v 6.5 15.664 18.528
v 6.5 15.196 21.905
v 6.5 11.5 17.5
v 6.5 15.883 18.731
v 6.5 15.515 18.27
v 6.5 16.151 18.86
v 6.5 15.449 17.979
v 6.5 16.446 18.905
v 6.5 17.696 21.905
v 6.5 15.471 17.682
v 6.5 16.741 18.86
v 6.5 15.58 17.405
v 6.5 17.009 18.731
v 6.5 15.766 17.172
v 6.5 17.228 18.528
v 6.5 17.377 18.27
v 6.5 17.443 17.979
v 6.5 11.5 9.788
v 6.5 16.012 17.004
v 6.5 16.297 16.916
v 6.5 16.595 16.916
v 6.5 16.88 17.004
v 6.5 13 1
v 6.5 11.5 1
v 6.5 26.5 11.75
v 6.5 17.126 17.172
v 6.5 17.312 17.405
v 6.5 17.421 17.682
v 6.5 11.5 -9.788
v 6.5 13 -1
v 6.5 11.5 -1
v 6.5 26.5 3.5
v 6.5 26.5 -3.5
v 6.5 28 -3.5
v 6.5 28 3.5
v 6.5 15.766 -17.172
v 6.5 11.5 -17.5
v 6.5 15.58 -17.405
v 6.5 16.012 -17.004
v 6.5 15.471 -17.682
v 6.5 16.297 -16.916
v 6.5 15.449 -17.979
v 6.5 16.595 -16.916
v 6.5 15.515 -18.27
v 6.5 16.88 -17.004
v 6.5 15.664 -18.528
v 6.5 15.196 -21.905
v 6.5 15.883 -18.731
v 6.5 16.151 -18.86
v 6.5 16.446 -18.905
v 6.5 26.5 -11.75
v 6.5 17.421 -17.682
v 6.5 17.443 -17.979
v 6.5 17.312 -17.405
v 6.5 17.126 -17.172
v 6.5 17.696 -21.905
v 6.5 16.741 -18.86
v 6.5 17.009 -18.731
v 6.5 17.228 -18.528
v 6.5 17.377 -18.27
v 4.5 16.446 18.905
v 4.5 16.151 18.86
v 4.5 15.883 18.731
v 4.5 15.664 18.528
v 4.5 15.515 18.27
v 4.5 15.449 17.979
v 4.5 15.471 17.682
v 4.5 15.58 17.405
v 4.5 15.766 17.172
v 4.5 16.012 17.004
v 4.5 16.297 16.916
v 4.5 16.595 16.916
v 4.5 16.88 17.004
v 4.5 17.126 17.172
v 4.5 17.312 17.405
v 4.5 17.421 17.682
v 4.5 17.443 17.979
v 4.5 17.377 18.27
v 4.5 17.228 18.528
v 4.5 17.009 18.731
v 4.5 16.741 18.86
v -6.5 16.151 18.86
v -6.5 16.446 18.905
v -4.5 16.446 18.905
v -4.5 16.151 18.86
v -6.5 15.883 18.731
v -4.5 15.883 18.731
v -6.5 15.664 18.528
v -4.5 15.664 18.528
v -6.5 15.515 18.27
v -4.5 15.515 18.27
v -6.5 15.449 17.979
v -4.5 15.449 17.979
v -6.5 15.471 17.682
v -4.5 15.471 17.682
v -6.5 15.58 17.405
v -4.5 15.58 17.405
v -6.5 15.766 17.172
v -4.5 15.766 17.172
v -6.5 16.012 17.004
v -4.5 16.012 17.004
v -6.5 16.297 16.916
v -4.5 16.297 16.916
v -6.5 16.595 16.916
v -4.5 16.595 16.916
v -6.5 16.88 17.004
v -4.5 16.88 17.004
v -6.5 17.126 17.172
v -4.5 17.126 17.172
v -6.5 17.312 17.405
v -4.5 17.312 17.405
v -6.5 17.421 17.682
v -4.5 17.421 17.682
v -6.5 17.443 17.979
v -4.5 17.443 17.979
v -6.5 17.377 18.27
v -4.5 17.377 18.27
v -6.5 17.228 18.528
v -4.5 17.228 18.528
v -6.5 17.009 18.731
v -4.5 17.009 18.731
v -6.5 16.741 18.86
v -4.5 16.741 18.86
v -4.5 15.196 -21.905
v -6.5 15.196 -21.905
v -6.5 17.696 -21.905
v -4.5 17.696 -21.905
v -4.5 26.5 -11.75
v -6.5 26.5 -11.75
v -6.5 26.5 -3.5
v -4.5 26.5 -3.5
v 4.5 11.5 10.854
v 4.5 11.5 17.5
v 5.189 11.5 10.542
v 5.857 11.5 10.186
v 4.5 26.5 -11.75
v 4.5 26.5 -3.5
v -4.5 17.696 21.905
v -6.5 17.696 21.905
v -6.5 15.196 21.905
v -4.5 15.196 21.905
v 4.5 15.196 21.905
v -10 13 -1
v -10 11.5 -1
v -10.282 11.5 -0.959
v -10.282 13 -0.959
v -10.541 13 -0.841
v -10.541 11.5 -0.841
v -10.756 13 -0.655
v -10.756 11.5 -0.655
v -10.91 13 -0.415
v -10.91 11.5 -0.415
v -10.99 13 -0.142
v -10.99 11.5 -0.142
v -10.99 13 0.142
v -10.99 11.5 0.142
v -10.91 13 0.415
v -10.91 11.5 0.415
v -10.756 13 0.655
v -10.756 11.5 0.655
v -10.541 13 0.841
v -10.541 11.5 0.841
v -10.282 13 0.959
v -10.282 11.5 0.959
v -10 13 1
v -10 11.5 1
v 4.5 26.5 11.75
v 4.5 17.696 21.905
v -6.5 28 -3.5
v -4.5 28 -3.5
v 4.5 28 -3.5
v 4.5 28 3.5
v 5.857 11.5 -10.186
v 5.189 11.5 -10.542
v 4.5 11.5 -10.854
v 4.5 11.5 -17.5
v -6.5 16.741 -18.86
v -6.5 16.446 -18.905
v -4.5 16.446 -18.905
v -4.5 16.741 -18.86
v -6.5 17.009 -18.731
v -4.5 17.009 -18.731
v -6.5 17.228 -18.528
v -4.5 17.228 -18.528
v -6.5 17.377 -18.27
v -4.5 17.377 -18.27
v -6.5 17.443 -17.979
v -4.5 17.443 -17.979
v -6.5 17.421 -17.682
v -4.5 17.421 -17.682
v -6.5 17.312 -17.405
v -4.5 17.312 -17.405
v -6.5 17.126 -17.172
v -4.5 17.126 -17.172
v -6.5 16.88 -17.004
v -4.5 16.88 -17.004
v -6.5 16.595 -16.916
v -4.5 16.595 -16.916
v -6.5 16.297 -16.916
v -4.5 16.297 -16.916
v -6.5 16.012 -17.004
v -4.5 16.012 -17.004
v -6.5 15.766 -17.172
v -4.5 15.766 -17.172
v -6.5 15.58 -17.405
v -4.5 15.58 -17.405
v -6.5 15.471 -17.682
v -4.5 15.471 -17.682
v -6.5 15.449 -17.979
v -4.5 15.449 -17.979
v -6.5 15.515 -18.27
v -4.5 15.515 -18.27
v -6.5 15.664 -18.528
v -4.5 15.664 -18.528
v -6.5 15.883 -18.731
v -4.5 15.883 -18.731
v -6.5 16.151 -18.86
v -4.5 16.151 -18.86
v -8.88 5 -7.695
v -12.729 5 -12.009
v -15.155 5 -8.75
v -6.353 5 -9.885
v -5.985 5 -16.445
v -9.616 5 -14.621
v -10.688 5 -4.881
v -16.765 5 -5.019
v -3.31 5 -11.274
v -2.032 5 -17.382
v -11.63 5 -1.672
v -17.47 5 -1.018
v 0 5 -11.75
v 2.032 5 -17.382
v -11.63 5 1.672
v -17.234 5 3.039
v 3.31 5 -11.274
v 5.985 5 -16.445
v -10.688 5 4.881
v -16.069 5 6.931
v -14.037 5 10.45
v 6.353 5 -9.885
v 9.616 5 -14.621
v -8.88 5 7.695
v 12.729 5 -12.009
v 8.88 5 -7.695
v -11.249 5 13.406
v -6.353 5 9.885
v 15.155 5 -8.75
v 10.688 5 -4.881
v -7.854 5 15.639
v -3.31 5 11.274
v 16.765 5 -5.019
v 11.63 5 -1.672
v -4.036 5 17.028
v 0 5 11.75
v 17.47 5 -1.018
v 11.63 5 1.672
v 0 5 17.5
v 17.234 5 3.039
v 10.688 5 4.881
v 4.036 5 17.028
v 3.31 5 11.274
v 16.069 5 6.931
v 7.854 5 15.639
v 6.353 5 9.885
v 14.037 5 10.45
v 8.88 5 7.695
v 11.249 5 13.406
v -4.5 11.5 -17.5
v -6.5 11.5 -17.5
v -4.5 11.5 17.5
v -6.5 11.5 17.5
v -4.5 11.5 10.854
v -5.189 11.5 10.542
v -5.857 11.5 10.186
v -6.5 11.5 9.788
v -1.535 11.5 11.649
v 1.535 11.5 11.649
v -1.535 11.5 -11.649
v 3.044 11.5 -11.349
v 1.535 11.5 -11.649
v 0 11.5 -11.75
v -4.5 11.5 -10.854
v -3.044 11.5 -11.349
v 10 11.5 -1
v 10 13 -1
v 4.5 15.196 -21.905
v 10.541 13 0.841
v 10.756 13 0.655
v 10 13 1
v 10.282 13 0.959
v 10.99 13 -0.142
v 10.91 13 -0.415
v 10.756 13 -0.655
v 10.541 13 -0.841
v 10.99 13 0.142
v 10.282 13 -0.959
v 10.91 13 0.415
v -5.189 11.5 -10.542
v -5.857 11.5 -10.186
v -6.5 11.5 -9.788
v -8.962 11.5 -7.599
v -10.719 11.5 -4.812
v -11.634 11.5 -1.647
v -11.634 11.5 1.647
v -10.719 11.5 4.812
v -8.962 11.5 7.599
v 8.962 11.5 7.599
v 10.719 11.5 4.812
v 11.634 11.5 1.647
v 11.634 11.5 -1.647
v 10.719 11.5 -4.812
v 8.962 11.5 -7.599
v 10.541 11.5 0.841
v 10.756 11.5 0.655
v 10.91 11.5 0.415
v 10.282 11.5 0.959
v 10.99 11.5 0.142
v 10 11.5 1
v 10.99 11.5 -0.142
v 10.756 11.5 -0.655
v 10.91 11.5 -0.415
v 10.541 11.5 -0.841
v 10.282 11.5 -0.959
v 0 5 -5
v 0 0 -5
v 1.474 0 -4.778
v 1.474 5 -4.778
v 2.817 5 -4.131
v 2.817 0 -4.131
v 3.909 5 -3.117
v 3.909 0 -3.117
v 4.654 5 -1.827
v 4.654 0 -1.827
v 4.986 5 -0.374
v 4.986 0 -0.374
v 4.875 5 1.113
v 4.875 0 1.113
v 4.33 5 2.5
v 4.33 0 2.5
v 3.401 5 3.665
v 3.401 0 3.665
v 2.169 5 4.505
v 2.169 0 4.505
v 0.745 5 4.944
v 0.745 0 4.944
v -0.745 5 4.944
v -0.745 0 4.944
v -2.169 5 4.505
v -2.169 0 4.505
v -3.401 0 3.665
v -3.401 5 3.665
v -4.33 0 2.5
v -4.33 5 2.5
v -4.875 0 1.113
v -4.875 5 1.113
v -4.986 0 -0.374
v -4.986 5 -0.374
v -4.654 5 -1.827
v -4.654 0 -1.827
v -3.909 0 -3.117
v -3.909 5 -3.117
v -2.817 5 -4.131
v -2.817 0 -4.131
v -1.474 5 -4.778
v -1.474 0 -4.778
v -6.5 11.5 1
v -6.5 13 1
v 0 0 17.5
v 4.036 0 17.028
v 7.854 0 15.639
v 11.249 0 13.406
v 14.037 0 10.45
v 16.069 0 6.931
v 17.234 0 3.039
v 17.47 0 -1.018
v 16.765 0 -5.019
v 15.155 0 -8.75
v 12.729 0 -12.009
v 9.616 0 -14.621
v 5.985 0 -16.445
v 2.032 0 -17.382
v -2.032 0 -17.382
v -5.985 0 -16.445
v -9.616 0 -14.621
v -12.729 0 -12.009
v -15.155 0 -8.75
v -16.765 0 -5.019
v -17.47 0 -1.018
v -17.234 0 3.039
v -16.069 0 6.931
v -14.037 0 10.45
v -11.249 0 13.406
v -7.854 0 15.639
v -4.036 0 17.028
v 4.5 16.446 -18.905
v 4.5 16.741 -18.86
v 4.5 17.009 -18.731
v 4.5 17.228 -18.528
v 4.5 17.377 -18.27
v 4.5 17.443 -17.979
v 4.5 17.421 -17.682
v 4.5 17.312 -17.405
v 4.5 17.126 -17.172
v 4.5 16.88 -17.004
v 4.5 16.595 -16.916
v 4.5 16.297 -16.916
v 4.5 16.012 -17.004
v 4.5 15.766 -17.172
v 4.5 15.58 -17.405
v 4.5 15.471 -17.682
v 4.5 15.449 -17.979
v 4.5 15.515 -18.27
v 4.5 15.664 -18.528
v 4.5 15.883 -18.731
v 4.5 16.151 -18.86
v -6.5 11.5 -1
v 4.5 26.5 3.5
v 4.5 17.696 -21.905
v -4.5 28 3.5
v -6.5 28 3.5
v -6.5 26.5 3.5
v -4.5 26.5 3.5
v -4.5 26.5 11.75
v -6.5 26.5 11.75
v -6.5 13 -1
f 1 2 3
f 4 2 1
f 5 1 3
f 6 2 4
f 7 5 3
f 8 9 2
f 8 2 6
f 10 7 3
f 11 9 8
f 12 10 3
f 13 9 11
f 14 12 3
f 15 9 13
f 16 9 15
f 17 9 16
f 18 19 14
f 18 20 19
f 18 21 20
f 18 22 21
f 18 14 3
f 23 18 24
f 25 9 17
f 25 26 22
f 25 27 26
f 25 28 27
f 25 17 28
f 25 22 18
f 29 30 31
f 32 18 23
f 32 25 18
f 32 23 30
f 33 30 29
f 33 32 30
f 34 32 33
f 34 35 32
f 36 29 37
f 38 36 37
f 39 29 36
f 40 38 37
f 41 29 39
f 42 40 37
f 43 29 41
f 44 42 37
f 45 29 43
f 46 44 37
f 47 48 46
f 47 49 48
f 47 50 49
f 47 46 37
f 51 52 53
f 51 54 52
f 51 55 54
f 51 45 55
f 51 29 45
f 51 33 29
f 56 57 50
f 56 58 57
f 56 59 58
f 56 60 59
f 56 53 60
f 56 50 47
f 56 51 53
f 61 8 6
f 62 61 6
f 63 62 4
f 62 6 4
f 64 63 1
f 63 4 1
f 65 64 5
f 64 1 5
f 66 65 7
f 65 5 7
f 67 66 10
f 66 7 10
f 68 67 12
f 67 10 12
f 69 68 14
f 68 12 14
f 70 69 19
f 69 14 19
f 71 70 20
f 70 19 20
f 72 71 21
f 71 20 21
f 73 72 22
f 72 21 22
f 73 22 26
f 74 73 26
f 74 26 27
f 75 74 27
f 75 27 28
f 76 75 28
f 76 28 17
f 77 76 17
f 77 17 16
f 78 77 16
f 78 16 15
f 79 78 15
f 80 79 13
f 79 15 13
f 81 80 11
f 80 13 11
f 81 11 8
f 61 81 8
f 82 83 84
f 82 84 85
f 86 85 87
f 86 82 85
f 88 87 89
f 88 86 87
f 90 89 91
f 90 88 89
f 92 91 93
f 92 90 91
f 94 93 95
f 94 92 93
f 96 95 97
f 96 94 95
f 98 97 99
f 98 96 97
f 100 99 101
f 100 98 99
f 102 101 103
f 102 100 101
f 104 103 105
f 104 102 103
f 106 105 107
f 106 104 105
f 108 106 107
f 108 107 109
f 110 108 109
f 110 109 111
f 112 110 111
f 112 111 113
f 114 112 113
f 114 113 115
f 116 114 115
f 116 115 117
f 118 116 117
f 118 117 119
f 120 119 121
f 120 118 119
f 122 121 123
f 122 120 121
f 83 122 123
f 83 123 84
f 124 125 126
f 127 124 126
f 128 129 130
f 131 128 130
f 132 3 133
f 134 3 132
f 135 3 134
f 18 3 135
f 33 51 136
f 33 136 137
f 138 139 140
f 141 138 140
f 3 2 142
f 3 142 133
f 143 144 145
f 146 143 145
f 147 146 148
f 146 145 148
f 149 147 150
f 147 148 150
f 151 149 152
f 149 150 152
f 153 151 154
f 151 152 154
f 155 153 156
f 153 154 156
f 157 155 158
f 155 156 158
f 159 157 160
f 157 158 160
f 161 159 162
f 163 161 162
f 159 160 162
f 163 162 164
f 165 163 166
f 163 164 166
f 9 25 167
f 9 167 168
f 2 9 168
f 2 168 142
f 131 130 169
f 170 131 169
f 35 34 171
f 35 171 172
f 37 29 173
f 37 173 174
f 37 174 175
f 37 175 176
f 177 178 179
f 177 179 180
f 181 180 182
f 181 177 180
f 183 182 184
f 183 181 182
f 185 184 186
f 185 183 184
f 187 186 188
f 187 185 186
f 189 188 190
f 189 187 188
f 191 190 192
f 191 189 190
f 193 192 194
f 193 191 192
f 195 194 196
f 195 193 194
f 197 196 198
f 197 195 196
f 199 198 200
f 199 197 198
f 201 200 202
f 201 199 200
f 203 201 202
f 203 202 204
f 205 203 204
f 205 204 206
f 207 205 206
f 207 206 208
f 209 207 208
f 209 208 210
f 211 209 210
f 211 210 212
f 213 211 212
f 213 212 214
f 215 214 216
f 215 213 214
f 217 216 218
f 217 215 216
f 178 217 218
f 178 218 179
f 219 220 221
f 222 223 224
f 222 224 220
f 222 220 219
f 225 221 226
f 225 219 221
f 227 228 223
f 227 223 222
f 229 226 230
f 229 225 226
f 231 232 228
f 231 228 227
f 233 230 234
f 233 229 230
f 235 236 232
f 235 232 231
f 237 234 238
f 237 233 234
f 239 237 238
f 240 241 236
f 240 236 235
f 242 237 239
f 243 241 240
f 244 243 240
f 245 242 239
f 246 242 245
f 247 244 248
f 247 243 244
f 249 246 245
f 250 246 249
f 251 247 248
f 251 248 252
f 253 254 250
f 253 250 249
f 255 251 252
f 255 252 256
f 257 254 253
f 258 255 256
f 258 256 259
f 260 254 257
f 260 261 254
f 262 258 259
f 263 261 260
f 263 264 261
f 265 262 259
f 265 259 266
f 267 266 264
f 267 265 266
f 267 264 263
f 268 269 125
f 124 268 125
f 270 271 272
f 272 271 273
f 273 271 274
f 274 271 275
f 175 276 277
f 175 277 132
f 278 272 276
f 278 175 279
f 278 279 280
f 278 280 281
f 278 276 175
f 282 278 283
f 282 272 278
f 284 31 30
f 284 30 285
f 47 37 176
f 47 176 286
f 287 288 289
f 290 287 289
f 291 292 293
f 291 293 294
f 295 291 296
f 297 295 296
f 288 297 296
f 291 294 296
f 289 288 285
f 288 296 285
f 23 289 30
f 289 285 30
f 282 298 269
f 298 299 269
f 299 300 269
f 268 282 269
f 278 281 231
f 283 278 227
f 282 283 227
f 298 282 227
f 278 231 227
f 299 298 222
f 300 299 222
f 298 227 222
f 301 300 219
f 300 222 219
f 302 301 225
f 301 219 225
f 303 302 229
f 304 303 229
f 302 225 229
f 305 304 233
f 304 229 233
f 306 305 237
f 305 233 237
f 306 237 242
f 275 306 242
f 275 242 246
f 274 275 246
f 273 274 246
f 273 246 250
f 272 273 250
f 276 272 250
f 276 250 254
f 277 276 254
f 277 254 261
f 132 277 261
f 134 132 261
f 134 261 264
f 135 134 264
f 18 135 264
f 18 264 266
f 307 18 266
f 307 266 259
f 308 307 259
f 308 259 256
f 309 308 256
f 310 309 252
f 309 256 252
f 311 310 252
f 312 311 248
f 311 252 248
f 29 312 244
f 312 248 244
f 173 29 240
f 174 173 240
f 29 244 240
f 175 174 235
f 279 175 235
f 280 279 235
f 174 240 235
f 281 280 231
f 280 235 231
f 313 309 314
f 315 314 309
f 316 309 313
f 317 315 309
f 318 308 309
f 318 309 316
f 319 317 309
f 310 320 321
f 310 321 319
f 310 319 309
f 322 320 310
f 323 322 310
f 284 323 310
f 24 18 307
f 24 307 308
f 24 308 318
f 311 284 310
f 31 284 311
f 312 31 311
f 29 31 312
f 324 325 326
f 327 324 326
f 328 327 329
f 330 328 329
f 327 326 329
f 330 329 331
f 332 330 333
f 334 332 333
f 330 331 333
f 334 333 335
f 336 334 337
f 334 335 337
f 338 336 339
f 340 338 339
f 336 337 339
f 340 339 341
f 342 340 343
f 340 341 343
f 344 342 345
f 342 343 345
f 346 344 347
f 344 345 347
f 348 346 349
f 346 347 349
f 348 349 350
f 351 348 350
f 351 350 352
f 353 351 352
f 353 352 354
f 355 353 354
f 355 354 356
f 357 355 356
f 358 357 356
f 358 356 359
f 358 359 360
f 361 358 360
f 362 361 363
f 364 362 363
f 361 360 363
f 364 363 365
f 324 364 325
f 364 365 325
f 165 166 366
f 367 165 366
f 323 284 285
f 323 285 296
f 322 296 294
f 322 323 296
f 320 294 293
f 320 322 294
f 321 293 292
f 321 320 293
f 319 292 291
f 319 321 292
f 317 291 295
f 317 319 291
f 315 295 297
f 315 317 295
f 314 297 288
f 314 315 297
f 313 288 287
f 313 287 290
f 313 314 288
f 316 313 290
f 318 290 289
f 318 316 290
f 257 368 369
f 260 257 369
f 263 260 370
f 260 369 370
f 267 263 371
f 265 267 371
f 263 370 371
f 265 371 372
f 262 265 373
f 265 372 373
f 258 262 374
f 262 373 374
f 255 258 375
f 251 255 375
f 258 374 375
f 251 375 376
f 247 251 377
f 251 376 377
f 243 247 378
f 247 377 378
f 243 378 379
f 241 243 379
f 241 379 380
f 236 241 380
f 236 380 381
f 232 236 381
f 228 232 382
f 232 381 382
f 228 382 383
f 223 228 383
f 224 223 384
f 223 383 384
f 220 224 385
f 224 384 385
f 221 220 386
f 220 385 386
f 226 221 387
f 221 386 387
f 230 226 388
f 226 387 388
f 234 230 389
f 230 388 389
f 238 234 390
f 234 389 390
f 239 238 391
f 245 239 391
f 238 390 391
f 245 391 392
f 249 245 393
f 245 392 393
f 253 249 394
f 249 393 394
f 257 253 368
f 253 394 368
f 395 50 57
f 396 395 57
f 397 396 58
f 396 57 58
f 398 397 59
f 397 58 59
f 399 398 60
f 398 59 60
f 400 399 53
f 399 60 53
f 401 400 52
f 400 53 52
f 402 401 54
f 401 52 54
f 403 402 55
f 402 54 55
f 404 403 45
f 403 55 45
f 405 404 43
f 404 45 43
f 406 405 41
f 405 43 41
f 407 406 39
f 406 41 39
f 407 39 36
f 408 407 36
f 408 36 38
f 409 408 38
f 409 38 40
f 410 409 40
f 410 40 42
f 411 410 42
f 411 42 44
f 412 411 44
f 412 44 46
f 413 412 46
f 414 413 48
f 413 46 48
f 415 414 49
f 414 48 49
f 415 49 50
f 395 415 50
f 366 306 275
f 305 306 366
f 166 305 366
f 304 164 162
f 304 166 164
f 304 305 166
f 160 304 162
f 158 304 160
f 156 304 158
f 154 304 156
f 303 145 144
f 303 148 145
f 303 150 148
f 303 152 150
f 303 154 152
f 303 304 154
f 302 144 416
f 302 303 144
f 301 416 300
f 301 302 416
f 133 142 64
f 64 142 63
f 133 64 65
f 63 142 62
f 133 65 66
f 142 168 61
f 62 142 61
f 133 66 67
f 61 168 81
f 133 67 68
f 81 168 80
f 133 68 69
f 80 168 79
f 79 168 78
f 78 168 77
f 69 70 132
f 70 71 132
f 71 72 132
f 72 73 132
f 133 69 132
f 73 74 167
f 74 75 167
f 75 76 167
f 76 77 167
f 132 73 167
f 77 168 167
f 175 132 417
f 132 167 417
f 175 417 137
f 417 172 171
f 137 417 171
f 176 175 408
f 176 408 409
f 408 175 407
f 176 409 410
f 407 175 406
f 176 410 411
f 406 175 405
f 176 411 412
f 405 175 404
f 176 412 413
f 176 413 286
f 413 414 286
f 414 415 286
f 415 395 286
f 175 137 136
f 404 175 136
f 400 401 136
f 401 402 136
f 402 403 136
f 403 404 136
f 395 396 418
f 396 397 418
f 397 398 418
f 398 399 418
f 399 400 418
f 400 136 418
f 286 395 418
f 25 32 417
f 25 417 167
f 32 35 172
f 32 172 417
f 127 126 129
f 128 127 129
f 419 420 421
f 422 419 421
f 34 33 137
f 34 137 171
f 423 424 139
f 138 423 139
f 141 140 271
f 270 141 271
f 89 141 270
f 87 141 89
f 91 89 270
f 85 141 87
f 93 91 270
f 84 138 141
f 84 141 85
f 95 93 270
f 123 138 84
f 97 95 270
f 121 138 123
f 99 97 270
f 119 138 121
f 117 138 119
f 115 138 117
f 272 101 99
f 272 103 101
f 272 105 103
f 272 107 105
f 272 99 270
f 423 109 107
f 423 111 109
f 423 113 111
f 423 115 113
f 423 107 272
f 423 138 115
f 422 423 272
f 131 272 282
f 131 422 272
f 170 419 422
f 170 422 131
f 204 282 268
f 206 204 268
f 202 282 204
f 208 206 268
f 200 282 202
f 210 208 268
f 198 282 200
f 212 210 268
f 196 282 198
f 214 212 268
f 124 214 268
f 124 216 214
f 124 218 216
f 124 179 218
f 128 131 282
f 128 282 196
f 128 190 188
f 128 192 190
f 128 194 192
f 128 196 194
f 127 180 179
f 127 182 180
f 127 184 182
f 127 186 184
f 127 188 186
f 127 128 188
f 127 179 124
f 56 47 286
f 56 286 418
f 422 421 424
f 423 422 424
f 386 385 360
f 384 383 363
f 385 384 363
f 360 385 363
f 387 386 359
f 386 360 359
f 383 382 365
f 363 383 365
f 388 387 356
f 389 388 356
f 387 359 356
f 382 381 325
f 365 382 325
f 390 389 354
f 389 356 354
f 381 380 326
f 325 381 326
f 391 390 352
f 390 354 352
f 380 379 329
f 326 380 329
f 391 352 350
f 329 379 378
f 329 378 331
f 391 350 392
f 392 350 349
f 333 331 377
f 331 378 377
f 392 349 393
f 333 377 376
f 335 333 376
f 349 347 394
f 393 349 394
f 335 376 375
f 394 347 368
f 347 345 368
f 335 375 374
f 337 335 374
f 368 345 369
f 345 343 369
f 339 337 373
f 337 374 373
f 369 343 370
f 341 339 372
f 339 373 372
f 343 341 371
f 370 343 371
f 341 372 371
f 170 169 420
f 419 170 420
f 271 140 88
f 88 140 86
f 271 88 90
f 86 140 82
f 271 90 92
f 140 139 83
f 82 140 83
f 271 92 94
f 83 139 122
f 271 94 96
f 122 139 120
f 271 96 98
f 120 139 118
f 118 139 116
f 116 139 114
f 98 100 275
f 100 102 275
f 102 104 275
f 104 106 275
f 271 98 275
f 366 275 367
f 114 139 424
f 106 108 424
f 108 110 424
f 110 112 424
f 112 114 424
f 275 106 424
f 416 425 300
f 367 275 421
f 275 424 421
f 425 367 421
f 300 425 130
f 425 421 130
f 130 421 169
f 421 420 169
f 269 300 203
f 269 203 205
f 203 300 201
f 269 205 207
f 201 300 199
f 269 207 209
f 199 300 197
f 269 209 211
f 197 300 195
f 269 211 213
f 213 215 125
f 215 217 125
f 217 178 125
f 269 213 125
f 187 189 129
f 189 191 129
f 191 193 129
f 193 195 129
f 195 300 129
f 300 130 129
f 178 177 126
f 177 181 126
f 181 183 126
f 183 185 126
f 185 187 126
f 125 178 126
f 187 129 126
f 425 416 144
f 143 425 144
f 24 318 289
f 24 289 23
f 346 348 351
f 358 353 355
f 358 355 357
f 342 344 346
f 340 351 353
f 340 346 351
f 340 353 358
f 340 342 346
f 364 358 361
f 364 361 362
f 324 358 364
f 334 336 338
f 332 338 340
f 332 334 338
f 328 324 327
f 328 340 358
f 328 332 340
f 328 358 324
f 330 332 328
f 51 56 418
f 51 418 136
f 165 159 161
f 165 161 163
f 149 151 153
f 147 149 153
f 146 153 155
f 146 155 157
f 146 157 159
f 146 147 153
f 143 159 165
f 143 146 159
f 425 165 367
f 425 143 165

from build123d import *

# Parameters (mm, degrees)
SKETCH1_R           = 17.5
BOSS_EXTRUDE1_DEPTH = 5
SKETCH2_R           = 11.75
BOSS_EXTRUDE2_DEPTH = 6.5
BOSS_EXTRUDE4_DEPTH = 1.5
SKETCH4_R           = 1
BOSS_EXTRUDE5_DEPTH = 2
SKETCH5_R           = 5
CUT_EXTRUDE1_DEPTH  = 5


with BuildPart() as part:
    # Sketch1 → Boss-Extrude1 (new body)
    with BuildSketch(Plane(origin=(0, 0, 0), x_dir=(1, 0, 0), z_dir=(0, 1, 0))):
        with Locations(Location((0, 0, 0), (0, 0, 270))):
            Circle(SKETCH1_R)
    extrude(amount=BOSS_EXTRUDE1_DEPTH)

    # Sketch2 → Boss-Extrude2 (add)
    with BuildSketch(Plane(origin=(0, 5, 0), x_dir=(1, 0, 0), z_dir=(0, 1, 0))):
        with Locations(Location((0, 0, 0), (0, 0, 90))):
            Circle(SKETCH2_R)
    extrude(amount=BOSS_EXTRUDE2_DEPTH)

    # Sketch3 → Boss-Extrude4 (add)
    with BuildSketch(Plane(origin=(0, 11.5, 0), x_dir=(1, 0, 0), z_dir=(0, 1, 0))):
        with BuildLine():
            Line((-6.5, 0), (-6.5, 1))
            Line((-6.5, 1), (-10, 1))
            ThreePointArc((-10, 1), (-11, 0), (-10, -1))
            Line((-10, -1), (-6.5, -1))
            Line((-6.5, -1), (-6.5, 0))
        make_face()
        with BuildLine():
            Line((6.5, -1), (6.5, 0))
            Line((6.5, 0), (6.5, 1))
            Line((6.5, 1), (10, 1))
            ThreePointArc((10, 1), (11, 0), (10, -1))
            Line((10, -1), (6.5, -1))
        make_face()
    extrude(amount=BOSS_EXTRUDE4_DEPTH)

    # Sketch4 → Boss-Extrude5 (add)
    with BuildSketch(Plane(origin=(-6.5, 0, 0), x_dir=(0, 0, -1), z_dir=(1, 0, 0))):
        Polygon((-17.5, 11.5), (17.5, 11.5), (21.904755548, 15.196028756), (21.904755548, 17.696028756), (11.75, 26.5), (3.5, 26.5), (3.5, 28), (-3.5, 28), (-3.5, 26.5), (-11.75, 26.5), (-21.904755548, 17.696028756), (-21.904755548, 15.196028756), align=None)
        with Locations((17.904755548, 16.446028756)):
            Circle(SKETCH4_R, mode=Mode.SUBTRACT)
        with Locations(Location((-17.904755548, 16.446028756, 0), (0, 0, 180))):
            Circle(SKETCH4_R, mode=Mode.SUBTRACT)
    boss_extrude5 = extrude(amount=BOSS_EXTRUDE5_DEPTH)

    # Mirror1: Boss-Extrude5 across plane
    add(boss_extrude5.mirror(Plane(origin=(0, 0, 0), x_dir=(0, 0, 1), z_dir=(1, 0, 0))))

    # Sketch5 → Cut-Extrude1 (cut)
    with BuildSketch(Plane.XZ):
        with Locations(Location((0, 0, 0), (0, 0, 270))):
            Circle(SKETCH5_R)
    extrude(amount=-CUT_EXTRUDE1_DEPTH, mode=Mode.SUBTRACT)


solid = part.part
